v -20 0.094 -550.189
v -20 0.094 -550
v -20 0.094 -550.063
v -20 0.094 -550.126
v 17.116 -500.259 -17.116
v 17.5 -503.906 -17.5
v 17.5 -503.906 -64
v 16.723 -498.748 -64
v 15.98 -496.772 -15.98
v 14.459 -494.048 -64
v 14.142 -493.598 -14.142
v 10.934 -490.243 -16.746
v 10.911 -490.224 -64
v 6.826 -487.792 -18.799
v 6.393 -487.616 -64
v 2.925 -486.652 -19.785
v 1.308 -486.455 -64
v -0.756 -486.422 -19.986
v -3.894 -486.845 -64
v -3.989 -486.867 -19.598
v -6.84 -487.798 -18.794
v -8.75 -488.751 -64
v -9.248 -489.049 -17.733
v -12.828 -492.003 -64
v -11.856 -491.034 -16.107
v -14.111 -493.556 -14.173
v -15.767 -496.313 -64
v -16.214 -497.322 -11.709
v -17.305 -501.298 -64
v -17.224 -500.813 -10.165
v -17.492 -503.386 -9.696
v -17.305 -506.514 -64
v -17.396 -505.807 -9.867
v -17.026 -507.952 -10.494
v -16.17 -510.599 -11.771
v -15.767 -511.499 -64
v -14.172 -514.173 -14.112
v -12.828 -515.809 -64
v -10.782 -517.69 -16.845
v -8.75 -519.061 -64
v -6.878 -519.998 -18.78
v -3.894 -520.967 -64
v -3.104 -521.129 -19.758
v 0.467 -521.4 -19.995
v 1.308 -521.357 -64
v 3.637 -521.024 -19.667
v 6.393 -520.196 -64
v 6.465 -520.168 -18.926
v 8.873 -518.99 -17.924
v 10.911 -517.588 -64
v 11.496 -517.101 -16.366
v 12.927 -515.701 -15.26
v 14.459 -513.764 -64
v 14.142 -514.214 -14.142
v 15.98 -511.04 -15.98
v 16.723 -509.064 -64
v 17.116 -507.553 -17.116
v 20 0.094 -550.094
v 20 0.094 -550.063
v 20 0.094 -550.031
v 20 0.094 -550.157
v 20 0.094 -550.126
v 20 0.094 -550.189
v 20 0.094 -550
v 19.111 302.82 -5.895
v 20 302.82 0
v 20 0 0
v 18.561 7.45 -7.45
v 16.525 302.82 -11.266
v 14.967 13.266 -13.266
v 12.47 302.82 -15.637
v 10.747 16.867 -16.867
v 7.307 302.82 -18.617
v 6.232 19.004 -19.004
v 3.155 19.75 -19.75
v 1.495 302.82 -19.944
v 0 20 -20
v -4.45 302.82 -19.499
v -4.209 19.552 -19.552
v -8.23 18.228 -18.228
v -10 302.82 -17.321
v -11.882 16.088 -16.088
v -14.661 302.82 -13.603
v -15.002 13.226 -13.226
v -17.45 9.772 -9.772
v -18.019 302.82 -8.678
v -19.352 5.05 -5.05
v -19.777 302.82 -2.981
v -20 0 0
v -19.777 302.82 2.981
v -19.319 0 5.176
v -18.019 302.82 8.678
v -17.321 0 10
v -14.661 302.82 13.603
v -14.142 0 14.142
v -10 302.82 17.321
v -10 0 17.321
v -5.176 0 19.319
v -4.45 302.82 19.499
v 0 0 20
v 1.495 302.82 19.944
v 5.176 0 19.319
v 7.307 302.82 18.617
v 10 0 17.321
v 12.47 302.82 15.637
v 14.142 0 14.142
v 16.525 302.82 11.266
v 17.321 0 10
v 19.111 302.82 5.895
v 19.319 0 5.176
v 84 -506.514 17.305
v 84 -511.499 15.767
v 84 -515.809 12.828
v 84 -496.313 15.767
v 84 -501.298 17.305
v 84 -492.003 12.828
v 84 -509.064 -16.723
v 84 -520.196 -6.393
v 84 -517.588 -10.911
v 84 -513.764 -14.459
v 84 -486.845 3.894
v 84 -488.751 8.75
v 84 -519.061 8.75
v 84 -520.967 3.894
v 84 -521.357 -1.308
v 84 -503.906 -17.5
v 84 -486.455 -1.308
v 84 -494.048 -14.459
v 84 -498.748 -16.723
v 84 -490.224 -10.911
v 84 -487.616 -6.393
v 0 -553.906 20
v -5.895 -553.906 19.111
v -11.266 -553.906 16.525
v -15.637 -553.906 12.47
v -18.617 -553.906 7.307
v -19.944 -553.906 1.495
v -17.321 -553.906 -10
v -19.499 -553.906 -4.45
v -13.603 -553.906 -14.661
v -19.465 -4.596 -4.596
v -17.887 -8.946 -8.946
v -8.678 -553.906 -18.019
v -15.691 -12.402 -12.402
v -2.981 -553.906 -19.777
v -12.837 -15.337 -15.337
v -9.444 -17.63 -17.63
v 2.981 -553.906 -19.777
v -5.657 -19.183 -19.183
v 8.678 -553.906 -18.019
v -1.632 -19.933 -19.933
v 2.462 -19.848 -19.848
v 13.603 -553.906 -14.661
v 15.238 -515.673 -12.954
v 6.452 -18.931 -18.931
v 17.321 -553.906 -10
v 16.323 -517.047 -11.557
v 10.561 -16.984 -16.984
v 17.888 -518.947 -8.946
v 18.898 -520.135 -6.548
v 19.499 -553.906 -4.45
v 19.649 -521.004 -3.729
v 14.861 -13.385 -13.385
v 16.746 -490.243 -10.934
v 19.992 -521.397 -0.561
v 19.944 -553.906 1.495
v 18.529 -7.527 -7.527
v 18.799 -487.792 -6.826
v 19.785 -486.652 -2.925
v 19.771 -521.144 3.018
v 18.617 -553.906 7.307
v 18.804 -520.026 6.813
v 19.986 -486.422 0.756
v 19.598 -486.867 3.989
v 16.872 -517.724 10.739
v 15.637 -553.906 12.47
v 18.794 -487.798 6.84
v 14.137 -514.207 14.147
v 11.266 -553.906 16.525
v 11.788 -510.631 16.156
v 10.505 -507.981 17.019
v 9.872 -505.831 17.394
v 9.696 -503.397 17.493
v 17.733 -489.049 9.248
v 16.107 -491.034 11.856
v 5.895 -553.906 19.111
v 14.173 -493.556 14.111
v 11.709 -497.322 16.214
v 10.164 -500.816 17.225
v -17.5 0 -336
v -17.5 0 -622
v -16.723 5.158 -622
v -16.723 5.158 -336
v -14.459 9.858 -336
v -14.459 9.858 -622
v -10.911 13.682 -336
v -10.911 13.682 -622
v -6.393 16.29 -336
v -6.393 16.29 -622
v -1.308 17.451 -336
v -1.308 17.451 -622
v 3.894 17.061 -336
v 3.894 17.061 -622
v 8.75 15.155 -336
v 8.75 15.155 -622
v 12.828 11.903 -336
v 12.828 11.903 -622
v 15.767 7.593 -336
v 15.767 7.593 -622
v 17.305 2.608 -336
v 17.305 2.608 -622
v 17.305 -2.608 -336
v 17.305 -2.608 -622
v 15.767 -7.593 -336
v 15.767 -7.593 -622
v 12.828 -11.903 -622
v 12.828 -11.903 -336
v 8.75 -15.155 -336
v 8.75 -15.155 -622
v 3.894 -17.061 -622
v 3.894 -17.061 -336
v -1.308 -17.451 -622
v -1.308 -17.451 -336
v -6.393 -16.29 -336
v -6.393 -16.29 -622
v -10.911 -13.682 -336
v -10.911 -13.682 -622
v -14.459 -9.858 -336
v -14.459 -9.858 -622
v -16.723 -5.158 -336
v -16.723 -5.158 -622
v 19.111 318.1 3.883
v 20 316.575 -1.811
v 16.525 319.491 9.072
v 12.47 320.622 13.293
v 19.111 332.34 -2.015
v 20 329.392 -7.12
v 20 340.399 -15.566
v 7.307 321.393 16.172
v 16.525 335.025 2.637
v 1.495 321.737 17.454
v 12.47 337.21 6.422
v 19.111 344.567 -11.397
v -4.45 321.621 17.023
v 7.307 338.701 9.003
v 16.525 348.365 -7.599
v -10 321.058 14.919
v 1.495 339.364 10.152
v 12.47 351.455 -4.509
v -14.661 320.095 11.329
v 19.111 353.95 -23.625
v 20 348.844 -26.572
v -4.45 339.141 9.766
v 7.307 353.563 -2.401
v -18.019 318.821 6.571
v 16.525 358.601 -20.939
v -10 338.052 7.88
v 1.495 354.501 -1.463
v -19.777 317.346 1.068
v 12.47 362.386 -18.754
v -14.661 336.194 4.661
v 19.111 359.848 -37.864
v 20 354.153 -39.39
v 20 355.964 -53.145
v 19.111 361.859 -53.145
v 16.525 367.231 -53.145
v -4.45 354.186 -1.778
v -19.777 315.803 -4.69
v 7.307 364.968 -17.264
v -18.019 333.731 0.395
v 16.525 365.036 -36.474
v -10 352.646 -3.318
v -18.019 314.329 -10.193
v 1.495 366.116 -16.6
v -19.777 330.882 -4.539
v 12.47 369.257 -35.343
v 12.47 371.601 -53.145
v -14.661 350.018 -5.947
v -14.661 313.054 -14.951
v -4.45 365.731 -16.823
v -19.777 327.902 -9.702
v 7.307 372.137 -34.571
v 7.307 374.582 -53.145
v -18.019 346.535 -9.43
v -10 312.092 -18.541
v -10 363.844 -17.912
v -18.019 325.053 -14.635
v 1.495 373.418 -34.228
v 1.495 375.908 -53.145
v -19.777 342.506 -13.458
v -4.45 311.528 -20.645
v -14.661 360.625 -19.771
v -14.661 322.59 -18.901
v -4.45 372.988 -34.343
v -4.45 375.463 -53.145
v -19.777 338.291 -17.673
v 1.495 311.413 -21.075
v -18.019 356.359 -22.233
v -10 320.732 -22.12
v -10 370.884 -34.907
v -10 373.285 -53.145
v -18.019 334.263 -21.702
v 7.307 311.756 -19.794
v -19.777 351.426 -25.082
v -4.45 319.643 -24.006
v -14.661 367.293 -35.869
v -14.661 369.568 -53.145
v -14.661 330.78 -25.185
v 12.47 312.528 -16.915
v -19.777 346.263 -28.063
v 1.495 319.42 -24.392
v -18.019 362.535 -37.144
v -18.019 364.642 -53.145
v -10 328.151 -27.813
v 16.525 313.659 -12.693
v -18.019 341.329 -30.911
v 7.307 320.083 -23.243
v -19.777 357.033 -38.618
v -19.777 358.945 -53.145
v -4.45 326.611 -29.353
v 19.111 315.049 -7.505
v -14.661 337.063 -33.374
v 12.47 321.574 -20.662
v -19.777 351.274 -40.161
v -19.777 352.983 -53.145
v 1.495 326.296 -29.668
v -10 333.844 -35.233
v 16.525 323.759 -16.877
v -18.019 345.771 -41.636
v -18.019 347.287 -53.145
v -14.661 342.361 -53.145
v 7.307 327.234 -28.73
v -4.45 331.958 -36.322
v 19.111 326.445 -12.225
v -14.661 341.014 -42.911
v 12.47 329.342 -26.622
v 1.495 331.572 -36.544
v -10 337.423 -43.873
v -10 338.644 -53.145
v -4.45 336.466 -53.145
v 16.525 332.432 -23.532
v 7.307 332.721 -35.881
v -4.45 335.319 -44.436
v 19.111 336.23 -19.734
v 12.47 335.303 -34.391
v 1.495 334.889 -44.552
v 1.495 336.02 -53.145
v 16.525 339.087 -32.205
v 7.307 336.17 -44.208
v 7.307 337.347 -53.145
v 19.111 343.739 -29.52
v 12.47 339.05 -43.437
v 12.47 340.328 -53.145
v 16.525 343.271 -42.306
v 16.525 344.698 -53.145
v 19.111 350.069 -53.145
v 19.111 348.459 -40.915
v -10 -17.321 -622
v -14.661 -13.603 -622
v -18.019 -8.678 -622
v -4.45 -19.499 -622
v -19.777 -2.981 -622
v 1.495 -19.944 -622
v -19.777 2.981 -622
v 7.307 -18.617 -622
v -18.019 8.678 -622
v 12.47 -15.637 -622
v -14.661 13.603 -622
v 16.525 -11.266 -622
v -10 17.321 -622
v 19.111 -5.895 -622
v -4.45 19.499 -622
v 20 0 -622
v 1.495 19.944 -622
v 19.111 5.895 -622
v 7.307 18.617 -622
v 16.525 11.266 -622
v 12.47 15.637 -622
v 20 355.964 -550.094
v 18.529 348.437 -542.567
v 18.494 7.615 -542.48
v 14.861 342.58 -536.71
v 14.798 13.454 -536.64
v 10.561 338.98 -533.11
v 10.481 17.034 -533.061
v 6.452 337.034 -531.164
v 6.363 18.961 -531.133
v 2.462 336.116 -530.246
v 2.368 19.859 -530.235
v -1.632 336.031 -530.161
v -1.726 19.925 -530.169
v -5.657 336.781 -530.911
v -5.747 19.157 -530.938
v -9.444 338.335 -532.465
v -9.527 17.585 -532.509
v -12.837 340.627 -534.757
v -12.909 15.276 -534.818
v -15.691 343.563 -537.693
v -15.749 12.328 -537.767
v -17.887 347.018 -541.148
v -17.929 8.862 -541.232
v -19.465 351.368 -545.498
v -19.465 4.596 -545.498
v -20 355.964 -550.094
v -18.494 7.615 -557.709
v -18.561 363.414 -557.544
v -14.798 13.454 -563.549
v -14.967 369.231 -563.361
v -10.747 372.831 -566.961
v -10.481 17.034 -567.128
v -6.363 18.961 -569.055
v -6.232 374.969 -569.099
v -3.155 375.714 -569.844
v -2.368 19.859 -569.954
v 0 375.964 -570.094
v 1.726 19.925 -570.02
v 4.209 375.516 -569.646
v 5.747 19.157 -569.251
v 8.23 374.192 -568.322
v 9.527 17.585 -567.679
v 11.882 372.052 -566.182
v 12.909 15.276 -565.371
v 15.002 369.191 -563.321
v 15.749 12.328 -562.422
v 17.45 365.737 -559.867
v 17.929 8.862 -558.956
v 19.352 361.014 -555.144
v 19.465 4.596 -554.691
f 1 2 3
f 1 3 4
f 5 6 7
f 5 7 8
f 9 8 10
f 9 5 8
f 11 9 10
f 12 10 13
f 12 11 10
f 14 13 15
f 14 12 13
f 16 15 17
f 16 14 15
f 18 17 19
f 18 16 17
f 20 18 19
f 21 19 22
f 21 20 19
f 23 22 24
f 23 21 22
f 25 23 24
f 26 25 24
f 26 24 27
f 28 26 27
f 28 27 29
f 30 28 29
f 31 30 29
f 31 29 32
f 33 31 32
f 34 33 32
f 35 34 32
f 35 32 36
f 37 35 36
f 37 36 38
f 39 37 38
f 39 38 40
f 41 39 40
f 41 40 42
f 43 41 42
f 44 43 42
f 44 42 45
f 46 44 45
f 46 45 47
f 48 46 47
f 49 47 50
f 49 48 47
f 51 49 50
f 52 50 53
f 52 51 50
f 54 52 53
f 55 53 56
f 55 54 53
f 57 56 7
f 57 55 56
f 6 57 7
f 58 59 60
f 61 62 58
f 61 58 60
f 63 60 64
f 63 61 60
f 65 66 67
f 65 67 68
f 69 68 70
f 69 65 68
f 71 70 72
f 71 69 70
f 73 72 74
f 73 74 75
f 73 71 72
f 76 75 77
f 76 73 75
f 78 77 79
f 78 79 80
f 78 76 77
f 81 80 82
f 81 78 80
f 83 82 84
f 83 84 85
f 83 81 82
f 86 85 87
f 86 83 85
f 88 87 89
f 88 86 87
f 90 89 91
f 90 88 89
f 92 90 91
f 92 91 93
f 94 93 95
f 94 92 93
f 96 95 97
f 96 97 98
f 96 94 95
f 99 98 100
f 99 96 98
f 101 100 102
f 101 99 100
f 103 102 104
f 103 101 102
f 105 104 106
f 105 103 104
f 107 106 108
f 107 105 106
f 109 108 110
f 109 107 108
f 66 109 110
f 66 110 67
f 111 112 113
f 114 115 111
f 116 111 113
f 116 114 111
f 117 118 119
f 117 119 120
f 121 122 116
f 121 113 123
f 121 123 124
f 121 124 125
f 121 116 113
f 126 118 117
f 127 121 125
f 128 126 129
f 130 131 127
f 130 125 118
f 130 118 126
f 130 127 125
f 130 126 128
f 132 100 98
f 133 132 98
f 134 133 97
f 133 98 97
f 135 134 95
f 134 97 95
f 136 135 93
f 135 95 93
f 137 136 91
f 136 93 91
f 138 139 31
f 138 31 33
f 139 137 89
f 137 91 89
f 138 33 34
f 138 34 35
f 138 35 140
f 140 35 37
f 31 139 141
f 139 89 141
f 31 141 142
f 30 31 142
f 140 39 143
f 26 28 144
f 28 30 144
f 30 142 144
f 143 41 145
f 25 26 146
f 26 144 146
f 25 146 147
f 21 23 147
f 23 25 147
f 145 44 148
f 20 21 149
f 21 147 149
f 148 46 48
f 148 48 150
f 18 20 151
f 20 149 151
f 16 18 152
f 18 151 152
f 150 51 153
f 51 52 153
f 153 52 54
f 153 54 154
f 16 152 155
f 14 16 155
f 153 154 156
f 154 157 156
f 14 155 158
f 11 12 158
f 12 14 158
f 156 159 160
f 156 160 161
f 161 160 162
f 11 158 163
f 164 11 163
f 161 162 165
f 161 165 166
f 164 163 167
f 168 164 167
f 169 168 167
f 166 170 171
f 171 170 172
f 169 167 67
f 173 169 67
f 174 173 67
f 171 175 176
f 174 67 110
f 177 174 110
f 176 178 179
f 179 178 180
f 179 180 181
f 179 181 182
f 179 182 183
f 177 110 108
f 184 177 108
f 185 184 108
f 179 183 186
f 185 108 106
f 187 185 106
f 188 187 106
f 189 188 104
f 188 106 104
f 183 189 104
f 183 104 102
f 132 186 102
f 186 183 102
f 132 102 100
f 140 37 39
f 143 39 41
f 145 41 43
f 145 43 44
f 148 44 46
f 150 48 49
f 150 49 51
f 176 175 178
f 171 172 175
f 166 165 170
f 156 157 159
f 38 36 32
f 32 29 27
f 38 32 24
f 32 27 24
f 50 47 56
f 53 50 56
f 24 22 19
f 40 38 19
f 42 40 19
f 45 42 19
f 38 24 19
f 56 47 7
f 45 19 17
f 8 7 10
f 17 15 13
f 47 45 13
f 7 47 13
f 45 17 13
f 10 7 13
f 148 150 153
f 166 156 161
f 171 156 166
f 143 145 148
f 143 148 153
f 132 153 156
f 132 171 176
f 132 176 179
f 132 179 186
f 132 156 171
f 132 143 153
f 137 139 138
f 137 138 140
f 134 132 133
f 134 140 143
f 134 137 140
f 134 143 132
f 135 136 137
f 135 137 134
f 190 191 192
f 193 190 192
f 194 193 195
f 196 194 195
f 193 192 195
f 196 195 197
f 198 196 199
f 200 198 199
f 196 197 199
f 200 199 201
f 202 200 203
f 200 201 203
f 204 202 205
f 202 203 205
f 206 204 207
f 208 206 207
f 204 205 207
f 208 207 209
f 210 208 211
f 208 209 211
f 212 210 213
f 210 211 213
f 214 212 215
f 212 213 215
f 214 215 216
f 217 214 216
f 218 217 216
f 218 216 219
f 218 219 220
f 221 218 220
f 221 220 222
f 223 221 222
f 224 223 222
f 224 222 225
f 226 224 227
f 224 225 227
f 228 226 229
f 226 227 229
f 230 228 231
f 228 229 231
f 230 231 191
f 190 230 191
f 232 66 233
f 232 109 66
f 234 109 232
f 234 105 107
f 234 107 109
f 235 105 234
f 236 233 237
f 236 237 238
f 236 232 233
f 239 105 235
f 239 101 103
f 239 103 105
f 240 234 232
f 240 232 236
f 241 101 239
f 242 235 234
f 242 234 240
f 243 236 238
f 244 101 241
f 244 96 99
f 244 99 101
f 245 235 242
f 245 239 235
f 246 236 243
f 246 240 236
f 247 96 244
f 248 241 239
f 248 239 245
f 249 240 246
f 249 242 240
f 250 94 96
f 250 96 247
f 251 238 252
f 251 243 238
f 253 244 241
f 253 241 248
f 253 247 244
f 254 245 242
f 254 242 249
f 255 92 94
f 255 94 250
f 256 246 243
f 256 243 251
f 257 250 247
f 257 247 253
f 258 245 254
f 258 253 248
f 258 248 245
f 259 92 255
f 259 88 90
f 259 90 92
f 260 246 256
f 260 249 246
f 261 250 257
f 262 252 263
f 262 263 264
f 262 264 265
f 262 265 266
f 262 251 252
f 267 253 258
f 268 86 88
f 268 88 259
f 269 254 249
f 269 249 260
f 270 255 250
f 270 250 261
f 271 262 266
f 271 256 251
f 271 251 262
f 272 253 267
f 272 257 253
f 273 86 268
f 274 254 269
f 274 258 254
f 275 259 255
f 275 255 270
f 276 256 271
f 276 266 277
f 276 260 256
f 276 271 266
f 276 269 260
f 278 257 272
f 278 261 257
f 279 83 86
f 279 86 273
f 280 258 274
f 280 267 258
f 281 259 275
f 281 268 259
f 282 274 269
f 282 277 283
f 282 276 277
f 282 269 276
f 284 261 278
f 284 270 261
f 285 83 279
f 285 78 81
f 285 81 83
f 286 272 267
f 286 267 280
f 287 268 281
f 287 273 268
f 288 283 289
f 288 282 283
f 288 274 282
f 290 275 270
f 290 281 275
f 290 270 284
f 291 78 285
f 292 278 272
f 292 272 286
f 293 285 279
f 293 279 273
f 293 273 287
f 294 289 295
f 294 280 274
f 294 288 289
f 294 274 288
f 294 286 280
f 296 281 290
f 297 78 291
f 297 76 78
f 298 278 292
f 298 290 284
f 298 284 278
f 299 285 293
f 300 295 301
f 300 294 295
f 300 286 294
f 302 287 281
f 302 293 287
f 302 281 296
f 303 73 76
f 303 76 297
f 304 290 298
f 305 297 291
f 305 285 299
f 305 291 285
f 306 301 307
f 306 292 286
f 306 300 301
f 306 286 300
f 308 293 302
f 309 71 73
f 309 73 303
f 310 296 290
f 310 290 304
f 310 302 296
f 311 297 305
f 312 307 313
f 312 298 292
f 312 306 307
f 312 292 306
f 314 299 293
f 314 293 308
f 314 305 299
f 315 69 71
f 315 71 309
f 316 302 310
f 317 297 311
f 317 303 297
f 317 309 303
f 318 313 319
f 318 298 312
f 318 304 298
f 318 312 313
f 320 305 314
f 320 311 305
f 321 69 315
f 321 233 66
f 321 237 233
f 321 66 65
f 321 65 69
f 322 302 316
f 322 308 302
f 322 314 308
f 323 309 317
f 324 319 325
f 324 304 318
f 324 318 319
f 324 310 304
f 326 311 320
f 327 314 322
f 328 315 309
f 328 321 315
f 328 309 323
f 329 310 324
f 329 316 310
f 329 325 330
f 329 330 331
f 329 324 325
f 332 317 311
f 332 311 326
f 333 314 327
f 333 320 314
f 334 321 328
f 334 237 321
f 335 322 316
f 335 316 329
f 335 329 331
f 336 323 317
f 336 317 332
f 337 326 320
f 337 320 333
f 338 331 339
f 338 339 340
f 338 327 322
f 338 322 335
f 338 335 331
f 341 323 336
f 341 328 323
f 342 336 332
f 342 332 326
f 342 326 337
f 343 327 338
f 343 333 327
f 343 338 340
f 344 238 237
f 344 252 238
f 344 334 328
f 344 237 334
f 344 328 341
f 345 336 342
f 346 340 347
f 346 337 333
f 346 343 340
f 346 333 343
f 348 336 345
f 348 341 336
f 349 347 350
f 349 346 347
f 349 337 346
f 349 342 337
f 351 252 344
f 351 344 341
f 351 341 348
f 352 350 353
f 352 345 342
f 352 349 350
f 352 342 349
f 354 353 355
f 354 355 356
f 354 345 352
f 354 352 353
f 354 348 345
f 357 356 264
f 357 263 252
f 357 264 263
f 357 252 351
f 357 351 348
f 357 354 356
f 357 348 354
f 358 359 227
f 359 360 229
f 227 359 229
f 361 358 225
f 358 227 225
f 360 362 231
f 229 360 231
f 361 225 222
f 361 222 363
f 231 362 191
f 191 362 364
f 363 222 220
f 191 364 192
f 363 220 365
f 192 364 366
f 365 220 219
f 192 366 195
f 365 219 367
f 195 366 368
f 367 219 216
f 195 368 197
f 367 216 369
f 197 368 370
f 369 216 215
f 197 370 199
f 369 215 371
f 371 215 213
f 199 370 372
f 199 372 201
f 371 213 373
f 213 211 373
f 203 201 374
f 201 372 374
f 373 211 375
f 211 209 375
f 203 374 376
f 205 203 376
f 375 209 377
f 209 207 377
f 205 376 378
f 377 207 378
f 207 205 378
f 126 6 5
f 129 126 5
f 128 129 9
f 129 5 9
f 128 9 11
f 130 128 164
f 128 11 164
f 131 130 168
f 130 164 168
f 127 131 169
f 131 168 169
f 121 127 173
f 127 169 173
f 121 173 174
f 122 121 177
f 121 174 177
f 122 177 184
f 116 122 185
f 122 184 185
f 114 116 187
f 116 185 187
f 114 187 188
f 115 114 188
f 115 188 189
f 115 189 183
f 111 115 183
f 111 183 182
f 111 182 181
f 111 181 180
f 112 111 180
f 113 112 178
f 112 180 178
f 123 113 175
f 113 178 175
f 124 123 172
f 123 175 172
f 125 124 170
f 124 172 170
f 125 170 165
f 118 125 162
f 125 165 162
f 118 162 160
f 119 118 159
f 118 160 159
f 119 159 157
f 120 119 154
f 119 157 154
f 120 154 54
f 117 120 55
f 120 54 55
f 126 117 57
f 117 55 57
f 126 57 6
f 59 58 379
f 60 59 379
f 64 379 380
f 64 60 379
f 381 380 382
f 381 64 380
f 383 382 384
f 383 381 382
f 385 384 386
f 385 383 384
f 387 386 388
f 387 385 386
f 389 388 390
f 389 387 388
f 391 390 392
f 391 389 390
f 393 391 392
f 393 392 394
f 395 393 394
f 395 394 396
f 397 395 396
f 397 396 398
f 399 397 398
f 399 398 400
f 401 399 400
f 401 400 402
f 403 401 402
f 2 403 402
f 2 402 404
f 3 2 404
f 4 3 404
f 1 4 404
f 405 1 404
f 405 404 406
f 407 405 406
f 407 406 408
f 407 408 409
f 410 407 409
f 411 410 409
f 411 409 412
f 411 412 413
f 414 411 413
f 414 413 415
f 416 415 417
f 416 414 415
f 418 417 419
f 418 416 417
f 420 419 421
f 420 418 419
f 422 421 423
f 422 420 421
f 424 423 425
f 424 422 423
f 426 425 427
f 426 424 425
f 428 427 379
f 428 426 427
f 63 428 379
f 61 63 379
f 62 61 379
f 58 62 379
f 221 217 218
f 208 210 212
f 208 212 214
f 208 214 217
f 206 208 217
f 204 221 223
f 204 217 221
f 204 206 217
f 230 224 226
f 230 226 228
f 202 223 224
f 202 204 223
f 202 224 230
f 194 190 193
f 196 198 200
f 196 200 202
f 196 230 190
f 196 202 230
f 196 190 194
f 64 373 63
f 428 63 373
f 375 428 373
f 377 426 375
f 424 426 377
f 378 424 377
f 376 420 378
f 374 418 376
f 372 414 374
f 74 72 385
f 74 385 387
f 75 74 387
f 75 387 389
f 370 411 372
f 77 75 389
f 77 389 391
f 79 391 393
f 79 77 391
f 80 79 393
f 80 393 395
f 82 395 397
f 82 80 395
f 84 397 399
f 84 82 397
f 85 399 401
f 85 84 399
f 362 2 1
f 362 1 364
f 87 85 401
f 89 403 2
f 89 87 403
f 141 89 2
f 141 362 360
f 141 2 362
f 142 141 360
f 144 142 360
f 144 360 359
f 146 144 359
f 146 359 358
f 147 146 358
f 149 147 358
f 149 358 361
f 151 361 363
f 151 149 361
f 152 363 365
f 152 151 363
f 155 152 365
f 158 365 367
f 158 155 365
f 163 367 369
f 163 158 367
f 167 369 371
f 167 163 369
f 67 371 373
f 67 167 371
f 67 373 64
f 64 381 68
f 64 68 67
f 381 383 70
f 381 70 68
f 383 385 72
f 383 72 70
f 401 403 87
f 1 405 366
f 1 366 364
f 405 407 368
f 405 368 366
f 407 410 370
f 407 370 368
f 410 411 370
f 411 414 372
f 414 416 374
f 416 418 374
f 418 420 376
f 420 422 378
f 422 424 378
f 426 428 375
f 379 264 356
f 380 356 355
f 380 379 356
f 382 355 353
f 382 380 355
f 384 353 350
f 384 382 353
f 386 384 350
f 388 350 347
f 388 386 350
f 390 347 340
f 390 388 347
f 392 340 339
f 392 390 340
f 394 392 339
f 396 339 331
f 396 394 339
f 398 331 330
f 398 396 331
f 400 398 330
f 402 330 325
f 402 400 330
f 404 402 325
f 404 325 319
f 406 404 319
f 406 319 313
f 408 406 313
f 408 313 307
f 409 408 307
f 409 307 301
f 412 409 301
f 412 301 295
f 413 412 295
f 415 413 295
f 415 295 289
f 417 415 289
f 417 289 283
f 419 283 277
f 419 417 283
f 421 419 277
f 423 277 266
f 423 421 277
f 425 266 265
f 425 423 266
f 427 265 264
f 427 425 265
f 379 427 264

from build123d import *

# Parameters (mm, degrees)
SKETCH2_R           = 20
SKETCH5_R           = 20
BOSS_EXTRUDE1_DEPTH = 553.90605298
SKETCH6_R           = 20
BOSS_EXTRUDE2_DEPTH = 622
SKETCH7_R           = 17.5
CUT_EXTRUDE1_DEPTH  = 286
SKETCH8_R           = 17.5
BOSS_EXTRUDE4_DEPTH = 64
SKETCH11_R          = 17.5
BOSS_EXTRUDE5_DEPTH = 84


with BuildPart() as part:
    # Sweep1: sweep along a path in Sketch3
    with BuildLine(Plane(origin=(0, 0, 0), x_dir=(0, 0, -1), z_dir=(1, 0, 0))) as sweep1_path:
        Line((0, 0), (0, 302.819820908))
        ThreePointArc((0, 302.819820908), (15.565663847, 340.398657675), (53.144500614, 355.964321522))
        Line((53.144500614, 355.964321522), (550.094321522, 355.964321522))
        Line((550.094321522, 355.964321522), (550.094321522, 0.094321522))
    # Sketch2 → Sweep1 (sweep)
    with BuildSketch(Plane(origin=(0, 0, 0), x_dir=(1, 0, 0), z_dir=(0, 1, 0))):
        Circle(SKETCH2_R)
    sweep(path=sweep1_path.line, transition=Transition.RIGHT)

    # Sketch5 → Boss-Extrude1 (add)
    with BuildSketch(Plane.XZ):
        with Locations(Location((0, 0, 0), (0, 0, 90))):
            Circle(SKETCH5_R)
    extrude(amount=BOSS_EXTRUDE1_DEPTH)

    # Sketch6 → Boss-Extrude2 (add)
    with BuildSketch(Plane.XY):
        Circle(SKETCH6_R)
    extrude(amount=-BOSS_EXTRUDE2_DEPTH)

    # Sketch7 → Cut-Extrude1 (cut)
    with BuildSketch(Plane(origin=(0, 0, -622), x_dir=(-1, 0, 0), z_dir=(0, 0, -1))):
        Circle(SKETCH7_R)
    extrude(amount=-CUT_EXTRUDE1_DEPTH, mode=Mode.SUBTRACT)

    # Sketch8 → Boss-Extrude4 (add)
    with BuildSketch(Plane.XY):
        with Locations((0, -503.90605298)):
            Circle(SKETCH8_R)
    extrude(amount=-BOSS_EXTRUDE4_DEPTH)

    # Sketch11 → Boss-Extrude5 (add)
    with BuildSketch(Plane(origin=(0, 0, 0), x_dir=(0, 0, -1), z_dir=(1, 0, 0))):
        with Locations((0, -503.90605298)):
            Circle(SKETCH11_R)
    extrude(amount=BOSS_EXTRUDE5_DEPTH)


solid = part.part
